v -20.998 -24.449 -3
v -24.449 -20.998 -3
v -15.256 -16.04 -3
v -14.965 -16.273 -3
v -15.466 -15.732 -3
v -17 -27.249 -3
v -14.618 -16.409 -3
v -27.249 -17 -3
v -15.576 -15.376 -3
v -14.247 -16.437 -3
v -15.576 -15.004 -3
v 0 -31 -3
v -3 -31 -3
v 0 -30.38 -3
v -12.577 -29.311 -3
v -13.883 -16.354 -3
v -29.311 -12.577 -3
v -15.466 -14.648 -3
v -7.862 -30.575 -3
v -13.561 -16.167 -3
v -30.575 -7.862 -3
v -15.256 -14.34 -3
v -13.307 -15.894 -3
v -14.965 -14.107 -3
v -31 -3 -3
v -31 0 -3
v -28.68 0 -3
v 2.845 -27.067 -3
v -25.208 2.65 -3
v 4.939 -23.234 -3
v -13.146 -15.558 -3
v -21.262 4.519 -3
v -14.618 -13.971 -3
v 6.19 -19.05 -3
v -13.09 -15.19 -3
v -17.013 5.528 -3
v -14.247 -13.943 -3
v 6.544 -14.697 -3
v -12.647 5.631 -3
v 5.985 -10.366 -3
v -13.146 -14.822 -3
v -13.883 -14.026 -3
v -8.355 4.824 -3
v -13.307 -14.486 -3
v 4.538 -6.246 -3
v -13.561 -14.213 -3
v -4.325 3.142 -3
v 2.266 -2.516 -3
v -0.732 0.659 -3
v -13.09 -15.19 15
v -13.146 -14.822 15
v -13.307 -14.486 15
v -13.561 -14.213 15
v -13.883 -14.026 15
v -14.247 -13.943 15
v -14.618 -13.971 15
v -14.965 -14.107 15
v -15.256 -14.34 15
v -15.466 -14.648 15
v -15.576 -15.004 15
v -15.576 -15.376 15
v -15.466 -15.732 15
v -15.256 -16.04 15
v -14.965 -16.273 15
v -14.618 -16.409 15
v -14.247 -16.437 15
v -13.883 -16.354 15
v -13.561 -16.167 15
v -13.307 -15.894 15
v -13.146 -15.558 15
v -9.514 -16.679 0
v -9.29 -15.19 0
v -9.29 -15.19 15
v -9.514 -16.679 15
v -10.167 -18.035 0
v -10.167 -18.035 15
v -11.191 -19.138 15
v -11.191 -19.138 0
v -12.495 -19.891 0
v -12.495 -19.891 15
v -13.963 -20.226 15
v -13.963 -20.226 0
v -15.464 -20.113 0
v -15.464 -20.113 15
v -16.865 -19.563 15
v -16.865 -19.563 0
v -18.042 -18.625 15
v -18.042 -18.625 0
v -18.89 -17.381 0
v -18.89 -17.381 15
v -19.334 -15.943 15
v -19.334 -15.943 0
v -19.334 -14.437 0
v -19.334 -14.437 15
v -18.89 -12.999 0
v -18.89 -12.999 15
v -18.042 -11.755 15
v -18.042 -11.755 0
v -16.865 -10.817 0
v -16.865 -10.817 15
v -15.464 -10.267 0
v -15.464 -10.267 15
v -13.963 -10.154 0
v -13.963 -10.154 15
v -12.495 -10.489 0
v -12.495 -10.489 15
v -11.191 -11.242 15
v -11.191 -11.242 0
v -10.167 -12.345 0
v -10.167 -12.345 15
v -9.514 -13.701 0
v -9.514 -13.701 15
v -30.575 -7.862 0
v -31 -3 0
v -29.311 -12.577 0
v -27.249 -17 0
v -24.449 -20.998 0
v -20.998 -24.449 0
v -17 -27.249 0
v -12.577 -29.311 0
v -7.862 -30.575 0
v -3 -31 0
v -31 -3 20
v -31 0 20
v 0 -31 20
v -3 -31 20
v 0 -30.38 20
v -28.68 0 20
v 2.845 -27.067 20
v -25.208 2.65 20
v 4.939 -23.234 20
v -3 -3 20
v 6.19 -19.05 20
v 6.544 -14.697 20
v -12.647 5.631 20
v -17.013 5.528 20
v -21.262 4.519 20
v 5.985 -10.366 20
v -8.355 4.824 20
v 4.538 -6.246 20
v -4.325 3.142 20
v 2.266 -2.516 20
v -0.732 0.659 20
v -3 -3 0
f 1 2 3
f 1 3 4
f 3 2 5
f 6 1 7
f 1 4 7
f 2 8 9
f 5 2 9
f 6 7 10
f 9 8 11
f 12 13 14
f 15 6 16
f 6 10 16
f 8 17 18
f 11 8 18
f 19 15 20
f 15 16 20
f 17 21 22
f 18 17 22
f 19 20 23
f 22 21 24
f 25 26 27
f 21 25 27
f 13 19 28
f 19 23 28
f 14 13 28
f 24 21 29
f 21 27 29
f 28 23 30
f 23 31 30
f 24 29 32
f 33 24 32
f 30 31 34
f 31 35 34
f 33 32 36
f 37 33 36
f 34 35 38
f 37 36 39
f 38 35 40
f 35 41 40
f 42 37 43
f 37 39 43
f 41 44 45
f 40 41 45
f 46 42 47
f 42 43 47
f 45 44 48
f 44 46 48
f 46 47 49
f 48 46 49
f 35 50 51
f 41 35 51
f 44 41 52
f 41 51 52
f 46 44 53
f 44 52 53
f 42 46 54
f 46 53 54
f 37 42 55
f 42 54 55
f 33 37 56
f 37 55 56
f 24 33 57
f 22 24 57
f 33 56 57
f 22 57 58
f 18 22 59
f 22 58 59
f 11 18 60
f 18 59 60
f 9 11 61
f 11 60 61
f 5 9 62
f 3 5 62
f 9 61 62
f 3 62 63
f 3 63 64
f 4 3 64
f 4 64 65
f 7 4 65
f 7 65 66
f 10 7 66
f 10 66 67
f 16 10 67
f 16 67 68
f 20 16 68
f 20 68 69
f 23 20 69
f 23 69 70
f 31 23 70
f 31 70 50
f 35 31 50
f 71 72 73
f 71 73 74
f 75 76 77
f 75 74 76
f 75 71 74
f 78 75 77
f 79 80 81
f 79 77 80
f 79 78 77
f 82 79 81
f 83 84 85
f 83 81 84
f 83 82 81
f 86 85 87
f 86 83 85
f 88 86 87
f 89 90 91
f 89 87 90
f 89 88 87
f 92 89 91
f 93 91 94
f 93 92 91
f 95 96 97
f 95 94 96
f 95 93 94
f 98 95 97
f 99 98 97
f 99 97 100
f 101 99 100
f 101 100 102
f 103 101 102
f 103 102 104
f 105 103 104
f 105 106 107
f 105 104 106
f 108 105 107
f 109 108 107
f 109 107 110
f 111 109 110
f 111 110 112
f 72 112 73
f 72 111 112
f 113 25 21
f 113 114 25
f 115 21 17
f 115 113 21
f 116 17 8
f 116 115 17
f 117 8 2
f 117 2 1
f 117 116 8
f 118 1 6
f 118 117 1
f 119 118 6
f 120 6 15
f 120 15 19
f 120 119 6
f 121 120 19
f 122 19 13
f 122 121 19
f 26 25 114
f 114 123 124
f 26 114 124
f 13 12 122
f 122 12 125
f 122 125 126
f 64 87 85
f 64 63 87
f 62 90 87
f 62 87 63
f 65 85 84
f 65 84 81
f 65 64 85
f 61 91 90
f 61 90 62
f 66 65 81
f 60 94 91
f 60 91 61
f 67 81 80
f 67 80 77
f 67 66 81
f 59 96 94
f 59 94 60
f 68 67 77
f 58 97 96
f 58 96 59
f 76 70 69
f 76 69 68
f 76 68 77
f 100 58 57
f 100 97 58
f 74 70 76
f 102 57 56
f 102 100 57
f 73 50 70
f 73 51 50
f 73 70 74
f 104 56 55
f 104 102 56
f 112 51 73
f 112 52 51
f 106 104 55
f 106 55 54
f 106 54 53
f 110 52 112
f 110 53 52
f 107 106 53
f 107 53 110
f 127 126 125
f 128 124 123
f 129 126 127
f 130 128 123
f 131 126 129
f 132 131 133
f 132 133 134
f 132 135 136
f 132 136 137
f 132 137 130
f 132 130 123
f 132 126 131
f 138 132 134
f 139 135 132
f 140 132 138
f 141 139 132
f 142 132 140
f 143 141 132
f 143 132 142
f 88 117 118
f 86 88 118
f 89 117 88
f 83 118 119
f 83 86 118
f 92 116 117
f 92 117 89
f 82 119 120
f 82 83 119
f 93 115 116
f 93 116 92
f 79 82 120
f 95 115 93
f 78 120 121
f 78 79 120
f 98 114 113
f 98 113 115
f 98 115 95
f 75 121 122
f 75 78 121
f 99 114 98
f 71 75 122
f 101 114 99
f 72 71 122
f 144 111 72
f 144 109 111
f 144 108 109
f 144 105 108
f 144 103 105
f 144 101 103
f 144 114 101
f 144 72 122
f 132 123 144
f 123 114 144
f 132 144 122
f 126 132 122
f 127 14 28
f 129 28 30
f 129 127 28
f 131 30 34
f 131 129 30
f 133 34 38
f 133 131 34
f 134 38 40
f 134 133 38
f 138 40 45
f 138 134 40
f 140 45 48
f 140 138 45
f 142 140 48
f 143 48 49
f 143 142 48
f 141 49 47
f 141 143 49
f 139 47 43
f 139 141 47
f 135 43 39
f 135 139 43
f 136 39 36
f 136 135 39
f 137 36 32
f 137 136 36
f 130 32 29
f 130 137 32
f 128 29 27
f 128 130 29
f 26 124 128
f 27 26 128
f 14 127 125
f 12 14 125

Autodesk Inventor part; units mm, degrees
ref_plane "YZ Plane" through (0, 0, 0) normal (1, 0, 0) x (0, 1, 0)
ref_plane "XZ Plane" through (0, 0, 0) normal (0, 1, 0) x (-1, 0, 0)
ref_plane "XY Plane" through (0, 0, 0) normal (0, 0, 1) x (1, 0, 0)
sketch "Sketch1" plane through (0, 0, 0) normal (0, 0, 1) x (1, 0, 0)
  arc A0 (-31, -3) -> (-3, -31) centre (-3, -3) ccw
  line L0 (-31, -3) -> (-31, 0)
  line L1 (-31, 0) -> (0, 0)
  line L2 (0, 0) -> (0, -31)
  line L3 (0, -31) -> (-3, -31)
  line L4 (-31, -3) -> (-3, -3)
  line L5 (-3, -3) -> (-3, -31)
  circle A1 centre (-14.34, -15.19) radius 5.05
  circle A2 centre (-14.34, -15.19) radius 1.25
  arc A3 (0, -30.38) -> (-28.68, 0) centre (-14.34, -15.19) ccw
  dimension "wallThickness" = 3
  dimension "d1" = 3
  dimension "width" = 31
  dimension "d3" = 31
  dimension "diameter" = 10.1
  dimension "d5" = 12.19
  dimension "d6" = 11.34
  dimension "centerHoleDia" = 2.5
  dimension "setScrewRingRad" = 20.8895
extrude "Extrusion1" add sketch "Sketch1" against normal blind 3 contours L4 L5 A0 | L0 L1 L2 L3 L5 L4 | A3 L1 | L2 A3 | A1 | A2
extrude "Extrusion2" add sketch "Sketch1" along normal blind 20 contours L0 L1 L2 L3 L5 L4 | A3 L1 | L2 A3
extrude "Extrusion3" add sketch "Sketch1" along normal blind 15 contours A1 | A2
extrude "Extrusion7" cut sketch "Sketch1" along normal through all both and the other way through all contours A2
equation "\"d1\" = wallThickness"
equation "\"d3\" = width"
equation "\"d7\" = wallThickness"
properties part number "tv-mount"
